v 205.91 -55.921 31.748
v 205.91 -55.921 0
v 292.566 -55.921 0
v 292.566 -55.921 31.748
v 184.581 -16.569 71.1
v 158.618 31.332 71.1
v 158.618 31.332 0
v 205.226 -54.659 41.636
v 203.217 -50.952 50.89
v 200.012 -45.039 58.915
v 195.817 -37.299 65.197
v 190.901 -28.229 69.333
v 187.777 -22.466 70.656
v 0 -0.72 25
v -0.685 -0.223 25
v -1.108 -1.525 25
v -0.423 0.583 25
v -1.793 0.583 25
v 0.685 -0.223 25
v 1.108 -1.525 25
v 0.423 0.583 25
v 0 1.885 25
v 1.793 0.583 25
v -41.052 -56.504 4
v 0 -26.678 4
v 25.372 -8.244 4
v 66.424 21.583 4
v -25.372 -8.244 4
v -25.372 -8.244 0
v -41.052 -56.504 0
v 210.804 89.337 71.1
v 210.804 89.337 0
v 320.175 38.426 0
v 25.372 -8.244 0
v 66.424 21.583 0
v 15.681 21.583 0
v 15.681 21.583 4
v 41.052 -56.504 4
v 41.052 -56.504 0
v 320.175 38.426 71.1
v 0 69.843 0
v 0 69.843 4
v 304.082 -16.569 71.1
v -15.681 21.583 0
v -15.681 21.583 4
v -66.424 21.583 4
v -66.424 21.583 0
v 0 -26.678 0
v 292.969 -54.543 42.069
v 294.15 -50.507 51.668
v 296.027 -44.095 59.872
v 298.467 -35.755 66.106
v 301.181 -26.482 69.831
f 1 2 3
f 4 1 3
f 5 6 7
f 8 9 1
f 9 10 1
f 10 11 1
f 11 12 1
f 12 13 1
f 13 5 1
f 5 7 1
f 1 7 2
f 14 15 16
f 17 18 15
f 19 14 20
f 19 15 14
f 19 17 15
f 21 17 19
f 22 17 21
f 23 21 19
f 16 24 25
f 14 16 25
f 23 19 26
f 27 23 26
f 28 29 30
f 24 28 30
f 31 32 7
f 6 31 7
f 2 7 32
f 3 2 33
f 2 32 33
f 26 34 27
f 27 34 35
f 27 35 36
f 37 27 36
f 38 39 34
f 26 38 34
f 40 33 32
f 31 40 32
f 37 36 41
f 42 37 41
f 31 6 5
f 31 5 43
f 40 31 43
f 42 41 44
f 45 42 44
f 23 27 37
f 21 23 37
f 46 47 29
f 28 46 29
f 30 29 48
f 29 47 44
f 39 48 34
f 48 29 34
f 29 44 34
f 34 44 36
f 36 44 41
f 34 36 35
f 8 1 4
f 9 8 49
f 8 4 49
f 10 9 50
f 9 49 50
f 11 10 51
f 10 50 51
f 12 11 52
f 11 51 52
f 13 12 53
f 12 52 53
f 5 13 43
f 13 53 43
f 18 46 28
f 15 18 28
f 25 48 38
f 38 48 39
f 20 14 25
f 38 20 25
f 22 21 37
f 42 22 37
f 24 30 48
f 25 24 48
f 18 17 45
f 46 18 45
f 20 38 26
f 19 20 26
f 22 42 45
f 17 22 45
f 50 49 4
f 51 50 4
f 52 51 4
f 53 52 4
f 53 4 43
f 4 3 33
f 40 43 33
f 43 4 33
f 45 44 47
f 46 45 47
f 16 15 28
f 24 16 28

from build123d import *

# Parameters (mm, degrees)
F1_DEPTH = 25
F2_SIZE  = 21
F4_DEPTH = 71.1
F5_R     = 39.3516810667


with BuildPart() as f1:
    # F0 (on Top) → F1 (new body)
    with BuildSketch(Plane.XY):
        Polygon((15.6806584298, 21.5825747639), (0, 69.8426790655), (-15.6806584298, 21.5825747639), align=None)
        Polygon((0, -26.6775295377), (25.3718383054, -8.2438099951), (15.6806584298, 21.5825747639), (-15.6806584298, 21.5825747639), (-25.3718383054, -8.2438099951), align=None)
        Polygon((-15.6806584298, 21.5825747639), (-66.4243350407, 21.5825747639), (-25.3718383054, -8.2438099951), align=None)
        Polygon((-25.3718383054, -8.2438099951), (-41.0524967353, -56.5039142966), (0, -26.6775295377), align=None)
        Polygon((0, -26.6775295377), (41.0524967353, -56.5039142966), (25.3718383054, -8.2438099951), align=None)
        Polygon((25.3718383054, -8.2438099951), (66.4243350407, 21.5825747639), (15.6806584298, 21.5825747639), align=None)
    extrude(amount=F1_DEPTH)

    # F2
    f2_edges = [f1.edges().sort_by_distance(p)[0] for p in [
        (-7.840329, 45.712627, 25),
        (-41.052497, 21.582575, 25),
        (-45.898087, 6.669382, 25),
        (-33.212168, -32.373862, 25),
        (-20.526248, -41.590722, 25),
        (20.526248, -41.590722, 25),
        (33.212168, -32.373862, 25),
        (45.898087, 6.669382, 25),
        (41.052497, 21.582575, 25),
        (7.840329, 45.712627, 25),
    ]]
    chamfer(f2_edges, length=F2_SIZE)


with BuildPart() as f4:
    # F3 (on Top) → F4 (new body)
    with BuildSketch(Plane.XY):
        Polygon((210.8042389154, 89.3370583653), (158.618375659, 31.3318185508), (205.9099823236, -55.921074003), (292.565792799, -55.921074003), (320.1750814915, 38.4257361293), align=None)
    extrude(amount=F4_DEPTH)

    # F5
    f5_edges = [f4.edges().sort_by_distance(p)[0] for p in [
        (249.237888, -55.921074, 71.1),
    ]]
    fillet(f5_edges, radius=F5_R)


solid = Compound([f1.part, f4.part])
